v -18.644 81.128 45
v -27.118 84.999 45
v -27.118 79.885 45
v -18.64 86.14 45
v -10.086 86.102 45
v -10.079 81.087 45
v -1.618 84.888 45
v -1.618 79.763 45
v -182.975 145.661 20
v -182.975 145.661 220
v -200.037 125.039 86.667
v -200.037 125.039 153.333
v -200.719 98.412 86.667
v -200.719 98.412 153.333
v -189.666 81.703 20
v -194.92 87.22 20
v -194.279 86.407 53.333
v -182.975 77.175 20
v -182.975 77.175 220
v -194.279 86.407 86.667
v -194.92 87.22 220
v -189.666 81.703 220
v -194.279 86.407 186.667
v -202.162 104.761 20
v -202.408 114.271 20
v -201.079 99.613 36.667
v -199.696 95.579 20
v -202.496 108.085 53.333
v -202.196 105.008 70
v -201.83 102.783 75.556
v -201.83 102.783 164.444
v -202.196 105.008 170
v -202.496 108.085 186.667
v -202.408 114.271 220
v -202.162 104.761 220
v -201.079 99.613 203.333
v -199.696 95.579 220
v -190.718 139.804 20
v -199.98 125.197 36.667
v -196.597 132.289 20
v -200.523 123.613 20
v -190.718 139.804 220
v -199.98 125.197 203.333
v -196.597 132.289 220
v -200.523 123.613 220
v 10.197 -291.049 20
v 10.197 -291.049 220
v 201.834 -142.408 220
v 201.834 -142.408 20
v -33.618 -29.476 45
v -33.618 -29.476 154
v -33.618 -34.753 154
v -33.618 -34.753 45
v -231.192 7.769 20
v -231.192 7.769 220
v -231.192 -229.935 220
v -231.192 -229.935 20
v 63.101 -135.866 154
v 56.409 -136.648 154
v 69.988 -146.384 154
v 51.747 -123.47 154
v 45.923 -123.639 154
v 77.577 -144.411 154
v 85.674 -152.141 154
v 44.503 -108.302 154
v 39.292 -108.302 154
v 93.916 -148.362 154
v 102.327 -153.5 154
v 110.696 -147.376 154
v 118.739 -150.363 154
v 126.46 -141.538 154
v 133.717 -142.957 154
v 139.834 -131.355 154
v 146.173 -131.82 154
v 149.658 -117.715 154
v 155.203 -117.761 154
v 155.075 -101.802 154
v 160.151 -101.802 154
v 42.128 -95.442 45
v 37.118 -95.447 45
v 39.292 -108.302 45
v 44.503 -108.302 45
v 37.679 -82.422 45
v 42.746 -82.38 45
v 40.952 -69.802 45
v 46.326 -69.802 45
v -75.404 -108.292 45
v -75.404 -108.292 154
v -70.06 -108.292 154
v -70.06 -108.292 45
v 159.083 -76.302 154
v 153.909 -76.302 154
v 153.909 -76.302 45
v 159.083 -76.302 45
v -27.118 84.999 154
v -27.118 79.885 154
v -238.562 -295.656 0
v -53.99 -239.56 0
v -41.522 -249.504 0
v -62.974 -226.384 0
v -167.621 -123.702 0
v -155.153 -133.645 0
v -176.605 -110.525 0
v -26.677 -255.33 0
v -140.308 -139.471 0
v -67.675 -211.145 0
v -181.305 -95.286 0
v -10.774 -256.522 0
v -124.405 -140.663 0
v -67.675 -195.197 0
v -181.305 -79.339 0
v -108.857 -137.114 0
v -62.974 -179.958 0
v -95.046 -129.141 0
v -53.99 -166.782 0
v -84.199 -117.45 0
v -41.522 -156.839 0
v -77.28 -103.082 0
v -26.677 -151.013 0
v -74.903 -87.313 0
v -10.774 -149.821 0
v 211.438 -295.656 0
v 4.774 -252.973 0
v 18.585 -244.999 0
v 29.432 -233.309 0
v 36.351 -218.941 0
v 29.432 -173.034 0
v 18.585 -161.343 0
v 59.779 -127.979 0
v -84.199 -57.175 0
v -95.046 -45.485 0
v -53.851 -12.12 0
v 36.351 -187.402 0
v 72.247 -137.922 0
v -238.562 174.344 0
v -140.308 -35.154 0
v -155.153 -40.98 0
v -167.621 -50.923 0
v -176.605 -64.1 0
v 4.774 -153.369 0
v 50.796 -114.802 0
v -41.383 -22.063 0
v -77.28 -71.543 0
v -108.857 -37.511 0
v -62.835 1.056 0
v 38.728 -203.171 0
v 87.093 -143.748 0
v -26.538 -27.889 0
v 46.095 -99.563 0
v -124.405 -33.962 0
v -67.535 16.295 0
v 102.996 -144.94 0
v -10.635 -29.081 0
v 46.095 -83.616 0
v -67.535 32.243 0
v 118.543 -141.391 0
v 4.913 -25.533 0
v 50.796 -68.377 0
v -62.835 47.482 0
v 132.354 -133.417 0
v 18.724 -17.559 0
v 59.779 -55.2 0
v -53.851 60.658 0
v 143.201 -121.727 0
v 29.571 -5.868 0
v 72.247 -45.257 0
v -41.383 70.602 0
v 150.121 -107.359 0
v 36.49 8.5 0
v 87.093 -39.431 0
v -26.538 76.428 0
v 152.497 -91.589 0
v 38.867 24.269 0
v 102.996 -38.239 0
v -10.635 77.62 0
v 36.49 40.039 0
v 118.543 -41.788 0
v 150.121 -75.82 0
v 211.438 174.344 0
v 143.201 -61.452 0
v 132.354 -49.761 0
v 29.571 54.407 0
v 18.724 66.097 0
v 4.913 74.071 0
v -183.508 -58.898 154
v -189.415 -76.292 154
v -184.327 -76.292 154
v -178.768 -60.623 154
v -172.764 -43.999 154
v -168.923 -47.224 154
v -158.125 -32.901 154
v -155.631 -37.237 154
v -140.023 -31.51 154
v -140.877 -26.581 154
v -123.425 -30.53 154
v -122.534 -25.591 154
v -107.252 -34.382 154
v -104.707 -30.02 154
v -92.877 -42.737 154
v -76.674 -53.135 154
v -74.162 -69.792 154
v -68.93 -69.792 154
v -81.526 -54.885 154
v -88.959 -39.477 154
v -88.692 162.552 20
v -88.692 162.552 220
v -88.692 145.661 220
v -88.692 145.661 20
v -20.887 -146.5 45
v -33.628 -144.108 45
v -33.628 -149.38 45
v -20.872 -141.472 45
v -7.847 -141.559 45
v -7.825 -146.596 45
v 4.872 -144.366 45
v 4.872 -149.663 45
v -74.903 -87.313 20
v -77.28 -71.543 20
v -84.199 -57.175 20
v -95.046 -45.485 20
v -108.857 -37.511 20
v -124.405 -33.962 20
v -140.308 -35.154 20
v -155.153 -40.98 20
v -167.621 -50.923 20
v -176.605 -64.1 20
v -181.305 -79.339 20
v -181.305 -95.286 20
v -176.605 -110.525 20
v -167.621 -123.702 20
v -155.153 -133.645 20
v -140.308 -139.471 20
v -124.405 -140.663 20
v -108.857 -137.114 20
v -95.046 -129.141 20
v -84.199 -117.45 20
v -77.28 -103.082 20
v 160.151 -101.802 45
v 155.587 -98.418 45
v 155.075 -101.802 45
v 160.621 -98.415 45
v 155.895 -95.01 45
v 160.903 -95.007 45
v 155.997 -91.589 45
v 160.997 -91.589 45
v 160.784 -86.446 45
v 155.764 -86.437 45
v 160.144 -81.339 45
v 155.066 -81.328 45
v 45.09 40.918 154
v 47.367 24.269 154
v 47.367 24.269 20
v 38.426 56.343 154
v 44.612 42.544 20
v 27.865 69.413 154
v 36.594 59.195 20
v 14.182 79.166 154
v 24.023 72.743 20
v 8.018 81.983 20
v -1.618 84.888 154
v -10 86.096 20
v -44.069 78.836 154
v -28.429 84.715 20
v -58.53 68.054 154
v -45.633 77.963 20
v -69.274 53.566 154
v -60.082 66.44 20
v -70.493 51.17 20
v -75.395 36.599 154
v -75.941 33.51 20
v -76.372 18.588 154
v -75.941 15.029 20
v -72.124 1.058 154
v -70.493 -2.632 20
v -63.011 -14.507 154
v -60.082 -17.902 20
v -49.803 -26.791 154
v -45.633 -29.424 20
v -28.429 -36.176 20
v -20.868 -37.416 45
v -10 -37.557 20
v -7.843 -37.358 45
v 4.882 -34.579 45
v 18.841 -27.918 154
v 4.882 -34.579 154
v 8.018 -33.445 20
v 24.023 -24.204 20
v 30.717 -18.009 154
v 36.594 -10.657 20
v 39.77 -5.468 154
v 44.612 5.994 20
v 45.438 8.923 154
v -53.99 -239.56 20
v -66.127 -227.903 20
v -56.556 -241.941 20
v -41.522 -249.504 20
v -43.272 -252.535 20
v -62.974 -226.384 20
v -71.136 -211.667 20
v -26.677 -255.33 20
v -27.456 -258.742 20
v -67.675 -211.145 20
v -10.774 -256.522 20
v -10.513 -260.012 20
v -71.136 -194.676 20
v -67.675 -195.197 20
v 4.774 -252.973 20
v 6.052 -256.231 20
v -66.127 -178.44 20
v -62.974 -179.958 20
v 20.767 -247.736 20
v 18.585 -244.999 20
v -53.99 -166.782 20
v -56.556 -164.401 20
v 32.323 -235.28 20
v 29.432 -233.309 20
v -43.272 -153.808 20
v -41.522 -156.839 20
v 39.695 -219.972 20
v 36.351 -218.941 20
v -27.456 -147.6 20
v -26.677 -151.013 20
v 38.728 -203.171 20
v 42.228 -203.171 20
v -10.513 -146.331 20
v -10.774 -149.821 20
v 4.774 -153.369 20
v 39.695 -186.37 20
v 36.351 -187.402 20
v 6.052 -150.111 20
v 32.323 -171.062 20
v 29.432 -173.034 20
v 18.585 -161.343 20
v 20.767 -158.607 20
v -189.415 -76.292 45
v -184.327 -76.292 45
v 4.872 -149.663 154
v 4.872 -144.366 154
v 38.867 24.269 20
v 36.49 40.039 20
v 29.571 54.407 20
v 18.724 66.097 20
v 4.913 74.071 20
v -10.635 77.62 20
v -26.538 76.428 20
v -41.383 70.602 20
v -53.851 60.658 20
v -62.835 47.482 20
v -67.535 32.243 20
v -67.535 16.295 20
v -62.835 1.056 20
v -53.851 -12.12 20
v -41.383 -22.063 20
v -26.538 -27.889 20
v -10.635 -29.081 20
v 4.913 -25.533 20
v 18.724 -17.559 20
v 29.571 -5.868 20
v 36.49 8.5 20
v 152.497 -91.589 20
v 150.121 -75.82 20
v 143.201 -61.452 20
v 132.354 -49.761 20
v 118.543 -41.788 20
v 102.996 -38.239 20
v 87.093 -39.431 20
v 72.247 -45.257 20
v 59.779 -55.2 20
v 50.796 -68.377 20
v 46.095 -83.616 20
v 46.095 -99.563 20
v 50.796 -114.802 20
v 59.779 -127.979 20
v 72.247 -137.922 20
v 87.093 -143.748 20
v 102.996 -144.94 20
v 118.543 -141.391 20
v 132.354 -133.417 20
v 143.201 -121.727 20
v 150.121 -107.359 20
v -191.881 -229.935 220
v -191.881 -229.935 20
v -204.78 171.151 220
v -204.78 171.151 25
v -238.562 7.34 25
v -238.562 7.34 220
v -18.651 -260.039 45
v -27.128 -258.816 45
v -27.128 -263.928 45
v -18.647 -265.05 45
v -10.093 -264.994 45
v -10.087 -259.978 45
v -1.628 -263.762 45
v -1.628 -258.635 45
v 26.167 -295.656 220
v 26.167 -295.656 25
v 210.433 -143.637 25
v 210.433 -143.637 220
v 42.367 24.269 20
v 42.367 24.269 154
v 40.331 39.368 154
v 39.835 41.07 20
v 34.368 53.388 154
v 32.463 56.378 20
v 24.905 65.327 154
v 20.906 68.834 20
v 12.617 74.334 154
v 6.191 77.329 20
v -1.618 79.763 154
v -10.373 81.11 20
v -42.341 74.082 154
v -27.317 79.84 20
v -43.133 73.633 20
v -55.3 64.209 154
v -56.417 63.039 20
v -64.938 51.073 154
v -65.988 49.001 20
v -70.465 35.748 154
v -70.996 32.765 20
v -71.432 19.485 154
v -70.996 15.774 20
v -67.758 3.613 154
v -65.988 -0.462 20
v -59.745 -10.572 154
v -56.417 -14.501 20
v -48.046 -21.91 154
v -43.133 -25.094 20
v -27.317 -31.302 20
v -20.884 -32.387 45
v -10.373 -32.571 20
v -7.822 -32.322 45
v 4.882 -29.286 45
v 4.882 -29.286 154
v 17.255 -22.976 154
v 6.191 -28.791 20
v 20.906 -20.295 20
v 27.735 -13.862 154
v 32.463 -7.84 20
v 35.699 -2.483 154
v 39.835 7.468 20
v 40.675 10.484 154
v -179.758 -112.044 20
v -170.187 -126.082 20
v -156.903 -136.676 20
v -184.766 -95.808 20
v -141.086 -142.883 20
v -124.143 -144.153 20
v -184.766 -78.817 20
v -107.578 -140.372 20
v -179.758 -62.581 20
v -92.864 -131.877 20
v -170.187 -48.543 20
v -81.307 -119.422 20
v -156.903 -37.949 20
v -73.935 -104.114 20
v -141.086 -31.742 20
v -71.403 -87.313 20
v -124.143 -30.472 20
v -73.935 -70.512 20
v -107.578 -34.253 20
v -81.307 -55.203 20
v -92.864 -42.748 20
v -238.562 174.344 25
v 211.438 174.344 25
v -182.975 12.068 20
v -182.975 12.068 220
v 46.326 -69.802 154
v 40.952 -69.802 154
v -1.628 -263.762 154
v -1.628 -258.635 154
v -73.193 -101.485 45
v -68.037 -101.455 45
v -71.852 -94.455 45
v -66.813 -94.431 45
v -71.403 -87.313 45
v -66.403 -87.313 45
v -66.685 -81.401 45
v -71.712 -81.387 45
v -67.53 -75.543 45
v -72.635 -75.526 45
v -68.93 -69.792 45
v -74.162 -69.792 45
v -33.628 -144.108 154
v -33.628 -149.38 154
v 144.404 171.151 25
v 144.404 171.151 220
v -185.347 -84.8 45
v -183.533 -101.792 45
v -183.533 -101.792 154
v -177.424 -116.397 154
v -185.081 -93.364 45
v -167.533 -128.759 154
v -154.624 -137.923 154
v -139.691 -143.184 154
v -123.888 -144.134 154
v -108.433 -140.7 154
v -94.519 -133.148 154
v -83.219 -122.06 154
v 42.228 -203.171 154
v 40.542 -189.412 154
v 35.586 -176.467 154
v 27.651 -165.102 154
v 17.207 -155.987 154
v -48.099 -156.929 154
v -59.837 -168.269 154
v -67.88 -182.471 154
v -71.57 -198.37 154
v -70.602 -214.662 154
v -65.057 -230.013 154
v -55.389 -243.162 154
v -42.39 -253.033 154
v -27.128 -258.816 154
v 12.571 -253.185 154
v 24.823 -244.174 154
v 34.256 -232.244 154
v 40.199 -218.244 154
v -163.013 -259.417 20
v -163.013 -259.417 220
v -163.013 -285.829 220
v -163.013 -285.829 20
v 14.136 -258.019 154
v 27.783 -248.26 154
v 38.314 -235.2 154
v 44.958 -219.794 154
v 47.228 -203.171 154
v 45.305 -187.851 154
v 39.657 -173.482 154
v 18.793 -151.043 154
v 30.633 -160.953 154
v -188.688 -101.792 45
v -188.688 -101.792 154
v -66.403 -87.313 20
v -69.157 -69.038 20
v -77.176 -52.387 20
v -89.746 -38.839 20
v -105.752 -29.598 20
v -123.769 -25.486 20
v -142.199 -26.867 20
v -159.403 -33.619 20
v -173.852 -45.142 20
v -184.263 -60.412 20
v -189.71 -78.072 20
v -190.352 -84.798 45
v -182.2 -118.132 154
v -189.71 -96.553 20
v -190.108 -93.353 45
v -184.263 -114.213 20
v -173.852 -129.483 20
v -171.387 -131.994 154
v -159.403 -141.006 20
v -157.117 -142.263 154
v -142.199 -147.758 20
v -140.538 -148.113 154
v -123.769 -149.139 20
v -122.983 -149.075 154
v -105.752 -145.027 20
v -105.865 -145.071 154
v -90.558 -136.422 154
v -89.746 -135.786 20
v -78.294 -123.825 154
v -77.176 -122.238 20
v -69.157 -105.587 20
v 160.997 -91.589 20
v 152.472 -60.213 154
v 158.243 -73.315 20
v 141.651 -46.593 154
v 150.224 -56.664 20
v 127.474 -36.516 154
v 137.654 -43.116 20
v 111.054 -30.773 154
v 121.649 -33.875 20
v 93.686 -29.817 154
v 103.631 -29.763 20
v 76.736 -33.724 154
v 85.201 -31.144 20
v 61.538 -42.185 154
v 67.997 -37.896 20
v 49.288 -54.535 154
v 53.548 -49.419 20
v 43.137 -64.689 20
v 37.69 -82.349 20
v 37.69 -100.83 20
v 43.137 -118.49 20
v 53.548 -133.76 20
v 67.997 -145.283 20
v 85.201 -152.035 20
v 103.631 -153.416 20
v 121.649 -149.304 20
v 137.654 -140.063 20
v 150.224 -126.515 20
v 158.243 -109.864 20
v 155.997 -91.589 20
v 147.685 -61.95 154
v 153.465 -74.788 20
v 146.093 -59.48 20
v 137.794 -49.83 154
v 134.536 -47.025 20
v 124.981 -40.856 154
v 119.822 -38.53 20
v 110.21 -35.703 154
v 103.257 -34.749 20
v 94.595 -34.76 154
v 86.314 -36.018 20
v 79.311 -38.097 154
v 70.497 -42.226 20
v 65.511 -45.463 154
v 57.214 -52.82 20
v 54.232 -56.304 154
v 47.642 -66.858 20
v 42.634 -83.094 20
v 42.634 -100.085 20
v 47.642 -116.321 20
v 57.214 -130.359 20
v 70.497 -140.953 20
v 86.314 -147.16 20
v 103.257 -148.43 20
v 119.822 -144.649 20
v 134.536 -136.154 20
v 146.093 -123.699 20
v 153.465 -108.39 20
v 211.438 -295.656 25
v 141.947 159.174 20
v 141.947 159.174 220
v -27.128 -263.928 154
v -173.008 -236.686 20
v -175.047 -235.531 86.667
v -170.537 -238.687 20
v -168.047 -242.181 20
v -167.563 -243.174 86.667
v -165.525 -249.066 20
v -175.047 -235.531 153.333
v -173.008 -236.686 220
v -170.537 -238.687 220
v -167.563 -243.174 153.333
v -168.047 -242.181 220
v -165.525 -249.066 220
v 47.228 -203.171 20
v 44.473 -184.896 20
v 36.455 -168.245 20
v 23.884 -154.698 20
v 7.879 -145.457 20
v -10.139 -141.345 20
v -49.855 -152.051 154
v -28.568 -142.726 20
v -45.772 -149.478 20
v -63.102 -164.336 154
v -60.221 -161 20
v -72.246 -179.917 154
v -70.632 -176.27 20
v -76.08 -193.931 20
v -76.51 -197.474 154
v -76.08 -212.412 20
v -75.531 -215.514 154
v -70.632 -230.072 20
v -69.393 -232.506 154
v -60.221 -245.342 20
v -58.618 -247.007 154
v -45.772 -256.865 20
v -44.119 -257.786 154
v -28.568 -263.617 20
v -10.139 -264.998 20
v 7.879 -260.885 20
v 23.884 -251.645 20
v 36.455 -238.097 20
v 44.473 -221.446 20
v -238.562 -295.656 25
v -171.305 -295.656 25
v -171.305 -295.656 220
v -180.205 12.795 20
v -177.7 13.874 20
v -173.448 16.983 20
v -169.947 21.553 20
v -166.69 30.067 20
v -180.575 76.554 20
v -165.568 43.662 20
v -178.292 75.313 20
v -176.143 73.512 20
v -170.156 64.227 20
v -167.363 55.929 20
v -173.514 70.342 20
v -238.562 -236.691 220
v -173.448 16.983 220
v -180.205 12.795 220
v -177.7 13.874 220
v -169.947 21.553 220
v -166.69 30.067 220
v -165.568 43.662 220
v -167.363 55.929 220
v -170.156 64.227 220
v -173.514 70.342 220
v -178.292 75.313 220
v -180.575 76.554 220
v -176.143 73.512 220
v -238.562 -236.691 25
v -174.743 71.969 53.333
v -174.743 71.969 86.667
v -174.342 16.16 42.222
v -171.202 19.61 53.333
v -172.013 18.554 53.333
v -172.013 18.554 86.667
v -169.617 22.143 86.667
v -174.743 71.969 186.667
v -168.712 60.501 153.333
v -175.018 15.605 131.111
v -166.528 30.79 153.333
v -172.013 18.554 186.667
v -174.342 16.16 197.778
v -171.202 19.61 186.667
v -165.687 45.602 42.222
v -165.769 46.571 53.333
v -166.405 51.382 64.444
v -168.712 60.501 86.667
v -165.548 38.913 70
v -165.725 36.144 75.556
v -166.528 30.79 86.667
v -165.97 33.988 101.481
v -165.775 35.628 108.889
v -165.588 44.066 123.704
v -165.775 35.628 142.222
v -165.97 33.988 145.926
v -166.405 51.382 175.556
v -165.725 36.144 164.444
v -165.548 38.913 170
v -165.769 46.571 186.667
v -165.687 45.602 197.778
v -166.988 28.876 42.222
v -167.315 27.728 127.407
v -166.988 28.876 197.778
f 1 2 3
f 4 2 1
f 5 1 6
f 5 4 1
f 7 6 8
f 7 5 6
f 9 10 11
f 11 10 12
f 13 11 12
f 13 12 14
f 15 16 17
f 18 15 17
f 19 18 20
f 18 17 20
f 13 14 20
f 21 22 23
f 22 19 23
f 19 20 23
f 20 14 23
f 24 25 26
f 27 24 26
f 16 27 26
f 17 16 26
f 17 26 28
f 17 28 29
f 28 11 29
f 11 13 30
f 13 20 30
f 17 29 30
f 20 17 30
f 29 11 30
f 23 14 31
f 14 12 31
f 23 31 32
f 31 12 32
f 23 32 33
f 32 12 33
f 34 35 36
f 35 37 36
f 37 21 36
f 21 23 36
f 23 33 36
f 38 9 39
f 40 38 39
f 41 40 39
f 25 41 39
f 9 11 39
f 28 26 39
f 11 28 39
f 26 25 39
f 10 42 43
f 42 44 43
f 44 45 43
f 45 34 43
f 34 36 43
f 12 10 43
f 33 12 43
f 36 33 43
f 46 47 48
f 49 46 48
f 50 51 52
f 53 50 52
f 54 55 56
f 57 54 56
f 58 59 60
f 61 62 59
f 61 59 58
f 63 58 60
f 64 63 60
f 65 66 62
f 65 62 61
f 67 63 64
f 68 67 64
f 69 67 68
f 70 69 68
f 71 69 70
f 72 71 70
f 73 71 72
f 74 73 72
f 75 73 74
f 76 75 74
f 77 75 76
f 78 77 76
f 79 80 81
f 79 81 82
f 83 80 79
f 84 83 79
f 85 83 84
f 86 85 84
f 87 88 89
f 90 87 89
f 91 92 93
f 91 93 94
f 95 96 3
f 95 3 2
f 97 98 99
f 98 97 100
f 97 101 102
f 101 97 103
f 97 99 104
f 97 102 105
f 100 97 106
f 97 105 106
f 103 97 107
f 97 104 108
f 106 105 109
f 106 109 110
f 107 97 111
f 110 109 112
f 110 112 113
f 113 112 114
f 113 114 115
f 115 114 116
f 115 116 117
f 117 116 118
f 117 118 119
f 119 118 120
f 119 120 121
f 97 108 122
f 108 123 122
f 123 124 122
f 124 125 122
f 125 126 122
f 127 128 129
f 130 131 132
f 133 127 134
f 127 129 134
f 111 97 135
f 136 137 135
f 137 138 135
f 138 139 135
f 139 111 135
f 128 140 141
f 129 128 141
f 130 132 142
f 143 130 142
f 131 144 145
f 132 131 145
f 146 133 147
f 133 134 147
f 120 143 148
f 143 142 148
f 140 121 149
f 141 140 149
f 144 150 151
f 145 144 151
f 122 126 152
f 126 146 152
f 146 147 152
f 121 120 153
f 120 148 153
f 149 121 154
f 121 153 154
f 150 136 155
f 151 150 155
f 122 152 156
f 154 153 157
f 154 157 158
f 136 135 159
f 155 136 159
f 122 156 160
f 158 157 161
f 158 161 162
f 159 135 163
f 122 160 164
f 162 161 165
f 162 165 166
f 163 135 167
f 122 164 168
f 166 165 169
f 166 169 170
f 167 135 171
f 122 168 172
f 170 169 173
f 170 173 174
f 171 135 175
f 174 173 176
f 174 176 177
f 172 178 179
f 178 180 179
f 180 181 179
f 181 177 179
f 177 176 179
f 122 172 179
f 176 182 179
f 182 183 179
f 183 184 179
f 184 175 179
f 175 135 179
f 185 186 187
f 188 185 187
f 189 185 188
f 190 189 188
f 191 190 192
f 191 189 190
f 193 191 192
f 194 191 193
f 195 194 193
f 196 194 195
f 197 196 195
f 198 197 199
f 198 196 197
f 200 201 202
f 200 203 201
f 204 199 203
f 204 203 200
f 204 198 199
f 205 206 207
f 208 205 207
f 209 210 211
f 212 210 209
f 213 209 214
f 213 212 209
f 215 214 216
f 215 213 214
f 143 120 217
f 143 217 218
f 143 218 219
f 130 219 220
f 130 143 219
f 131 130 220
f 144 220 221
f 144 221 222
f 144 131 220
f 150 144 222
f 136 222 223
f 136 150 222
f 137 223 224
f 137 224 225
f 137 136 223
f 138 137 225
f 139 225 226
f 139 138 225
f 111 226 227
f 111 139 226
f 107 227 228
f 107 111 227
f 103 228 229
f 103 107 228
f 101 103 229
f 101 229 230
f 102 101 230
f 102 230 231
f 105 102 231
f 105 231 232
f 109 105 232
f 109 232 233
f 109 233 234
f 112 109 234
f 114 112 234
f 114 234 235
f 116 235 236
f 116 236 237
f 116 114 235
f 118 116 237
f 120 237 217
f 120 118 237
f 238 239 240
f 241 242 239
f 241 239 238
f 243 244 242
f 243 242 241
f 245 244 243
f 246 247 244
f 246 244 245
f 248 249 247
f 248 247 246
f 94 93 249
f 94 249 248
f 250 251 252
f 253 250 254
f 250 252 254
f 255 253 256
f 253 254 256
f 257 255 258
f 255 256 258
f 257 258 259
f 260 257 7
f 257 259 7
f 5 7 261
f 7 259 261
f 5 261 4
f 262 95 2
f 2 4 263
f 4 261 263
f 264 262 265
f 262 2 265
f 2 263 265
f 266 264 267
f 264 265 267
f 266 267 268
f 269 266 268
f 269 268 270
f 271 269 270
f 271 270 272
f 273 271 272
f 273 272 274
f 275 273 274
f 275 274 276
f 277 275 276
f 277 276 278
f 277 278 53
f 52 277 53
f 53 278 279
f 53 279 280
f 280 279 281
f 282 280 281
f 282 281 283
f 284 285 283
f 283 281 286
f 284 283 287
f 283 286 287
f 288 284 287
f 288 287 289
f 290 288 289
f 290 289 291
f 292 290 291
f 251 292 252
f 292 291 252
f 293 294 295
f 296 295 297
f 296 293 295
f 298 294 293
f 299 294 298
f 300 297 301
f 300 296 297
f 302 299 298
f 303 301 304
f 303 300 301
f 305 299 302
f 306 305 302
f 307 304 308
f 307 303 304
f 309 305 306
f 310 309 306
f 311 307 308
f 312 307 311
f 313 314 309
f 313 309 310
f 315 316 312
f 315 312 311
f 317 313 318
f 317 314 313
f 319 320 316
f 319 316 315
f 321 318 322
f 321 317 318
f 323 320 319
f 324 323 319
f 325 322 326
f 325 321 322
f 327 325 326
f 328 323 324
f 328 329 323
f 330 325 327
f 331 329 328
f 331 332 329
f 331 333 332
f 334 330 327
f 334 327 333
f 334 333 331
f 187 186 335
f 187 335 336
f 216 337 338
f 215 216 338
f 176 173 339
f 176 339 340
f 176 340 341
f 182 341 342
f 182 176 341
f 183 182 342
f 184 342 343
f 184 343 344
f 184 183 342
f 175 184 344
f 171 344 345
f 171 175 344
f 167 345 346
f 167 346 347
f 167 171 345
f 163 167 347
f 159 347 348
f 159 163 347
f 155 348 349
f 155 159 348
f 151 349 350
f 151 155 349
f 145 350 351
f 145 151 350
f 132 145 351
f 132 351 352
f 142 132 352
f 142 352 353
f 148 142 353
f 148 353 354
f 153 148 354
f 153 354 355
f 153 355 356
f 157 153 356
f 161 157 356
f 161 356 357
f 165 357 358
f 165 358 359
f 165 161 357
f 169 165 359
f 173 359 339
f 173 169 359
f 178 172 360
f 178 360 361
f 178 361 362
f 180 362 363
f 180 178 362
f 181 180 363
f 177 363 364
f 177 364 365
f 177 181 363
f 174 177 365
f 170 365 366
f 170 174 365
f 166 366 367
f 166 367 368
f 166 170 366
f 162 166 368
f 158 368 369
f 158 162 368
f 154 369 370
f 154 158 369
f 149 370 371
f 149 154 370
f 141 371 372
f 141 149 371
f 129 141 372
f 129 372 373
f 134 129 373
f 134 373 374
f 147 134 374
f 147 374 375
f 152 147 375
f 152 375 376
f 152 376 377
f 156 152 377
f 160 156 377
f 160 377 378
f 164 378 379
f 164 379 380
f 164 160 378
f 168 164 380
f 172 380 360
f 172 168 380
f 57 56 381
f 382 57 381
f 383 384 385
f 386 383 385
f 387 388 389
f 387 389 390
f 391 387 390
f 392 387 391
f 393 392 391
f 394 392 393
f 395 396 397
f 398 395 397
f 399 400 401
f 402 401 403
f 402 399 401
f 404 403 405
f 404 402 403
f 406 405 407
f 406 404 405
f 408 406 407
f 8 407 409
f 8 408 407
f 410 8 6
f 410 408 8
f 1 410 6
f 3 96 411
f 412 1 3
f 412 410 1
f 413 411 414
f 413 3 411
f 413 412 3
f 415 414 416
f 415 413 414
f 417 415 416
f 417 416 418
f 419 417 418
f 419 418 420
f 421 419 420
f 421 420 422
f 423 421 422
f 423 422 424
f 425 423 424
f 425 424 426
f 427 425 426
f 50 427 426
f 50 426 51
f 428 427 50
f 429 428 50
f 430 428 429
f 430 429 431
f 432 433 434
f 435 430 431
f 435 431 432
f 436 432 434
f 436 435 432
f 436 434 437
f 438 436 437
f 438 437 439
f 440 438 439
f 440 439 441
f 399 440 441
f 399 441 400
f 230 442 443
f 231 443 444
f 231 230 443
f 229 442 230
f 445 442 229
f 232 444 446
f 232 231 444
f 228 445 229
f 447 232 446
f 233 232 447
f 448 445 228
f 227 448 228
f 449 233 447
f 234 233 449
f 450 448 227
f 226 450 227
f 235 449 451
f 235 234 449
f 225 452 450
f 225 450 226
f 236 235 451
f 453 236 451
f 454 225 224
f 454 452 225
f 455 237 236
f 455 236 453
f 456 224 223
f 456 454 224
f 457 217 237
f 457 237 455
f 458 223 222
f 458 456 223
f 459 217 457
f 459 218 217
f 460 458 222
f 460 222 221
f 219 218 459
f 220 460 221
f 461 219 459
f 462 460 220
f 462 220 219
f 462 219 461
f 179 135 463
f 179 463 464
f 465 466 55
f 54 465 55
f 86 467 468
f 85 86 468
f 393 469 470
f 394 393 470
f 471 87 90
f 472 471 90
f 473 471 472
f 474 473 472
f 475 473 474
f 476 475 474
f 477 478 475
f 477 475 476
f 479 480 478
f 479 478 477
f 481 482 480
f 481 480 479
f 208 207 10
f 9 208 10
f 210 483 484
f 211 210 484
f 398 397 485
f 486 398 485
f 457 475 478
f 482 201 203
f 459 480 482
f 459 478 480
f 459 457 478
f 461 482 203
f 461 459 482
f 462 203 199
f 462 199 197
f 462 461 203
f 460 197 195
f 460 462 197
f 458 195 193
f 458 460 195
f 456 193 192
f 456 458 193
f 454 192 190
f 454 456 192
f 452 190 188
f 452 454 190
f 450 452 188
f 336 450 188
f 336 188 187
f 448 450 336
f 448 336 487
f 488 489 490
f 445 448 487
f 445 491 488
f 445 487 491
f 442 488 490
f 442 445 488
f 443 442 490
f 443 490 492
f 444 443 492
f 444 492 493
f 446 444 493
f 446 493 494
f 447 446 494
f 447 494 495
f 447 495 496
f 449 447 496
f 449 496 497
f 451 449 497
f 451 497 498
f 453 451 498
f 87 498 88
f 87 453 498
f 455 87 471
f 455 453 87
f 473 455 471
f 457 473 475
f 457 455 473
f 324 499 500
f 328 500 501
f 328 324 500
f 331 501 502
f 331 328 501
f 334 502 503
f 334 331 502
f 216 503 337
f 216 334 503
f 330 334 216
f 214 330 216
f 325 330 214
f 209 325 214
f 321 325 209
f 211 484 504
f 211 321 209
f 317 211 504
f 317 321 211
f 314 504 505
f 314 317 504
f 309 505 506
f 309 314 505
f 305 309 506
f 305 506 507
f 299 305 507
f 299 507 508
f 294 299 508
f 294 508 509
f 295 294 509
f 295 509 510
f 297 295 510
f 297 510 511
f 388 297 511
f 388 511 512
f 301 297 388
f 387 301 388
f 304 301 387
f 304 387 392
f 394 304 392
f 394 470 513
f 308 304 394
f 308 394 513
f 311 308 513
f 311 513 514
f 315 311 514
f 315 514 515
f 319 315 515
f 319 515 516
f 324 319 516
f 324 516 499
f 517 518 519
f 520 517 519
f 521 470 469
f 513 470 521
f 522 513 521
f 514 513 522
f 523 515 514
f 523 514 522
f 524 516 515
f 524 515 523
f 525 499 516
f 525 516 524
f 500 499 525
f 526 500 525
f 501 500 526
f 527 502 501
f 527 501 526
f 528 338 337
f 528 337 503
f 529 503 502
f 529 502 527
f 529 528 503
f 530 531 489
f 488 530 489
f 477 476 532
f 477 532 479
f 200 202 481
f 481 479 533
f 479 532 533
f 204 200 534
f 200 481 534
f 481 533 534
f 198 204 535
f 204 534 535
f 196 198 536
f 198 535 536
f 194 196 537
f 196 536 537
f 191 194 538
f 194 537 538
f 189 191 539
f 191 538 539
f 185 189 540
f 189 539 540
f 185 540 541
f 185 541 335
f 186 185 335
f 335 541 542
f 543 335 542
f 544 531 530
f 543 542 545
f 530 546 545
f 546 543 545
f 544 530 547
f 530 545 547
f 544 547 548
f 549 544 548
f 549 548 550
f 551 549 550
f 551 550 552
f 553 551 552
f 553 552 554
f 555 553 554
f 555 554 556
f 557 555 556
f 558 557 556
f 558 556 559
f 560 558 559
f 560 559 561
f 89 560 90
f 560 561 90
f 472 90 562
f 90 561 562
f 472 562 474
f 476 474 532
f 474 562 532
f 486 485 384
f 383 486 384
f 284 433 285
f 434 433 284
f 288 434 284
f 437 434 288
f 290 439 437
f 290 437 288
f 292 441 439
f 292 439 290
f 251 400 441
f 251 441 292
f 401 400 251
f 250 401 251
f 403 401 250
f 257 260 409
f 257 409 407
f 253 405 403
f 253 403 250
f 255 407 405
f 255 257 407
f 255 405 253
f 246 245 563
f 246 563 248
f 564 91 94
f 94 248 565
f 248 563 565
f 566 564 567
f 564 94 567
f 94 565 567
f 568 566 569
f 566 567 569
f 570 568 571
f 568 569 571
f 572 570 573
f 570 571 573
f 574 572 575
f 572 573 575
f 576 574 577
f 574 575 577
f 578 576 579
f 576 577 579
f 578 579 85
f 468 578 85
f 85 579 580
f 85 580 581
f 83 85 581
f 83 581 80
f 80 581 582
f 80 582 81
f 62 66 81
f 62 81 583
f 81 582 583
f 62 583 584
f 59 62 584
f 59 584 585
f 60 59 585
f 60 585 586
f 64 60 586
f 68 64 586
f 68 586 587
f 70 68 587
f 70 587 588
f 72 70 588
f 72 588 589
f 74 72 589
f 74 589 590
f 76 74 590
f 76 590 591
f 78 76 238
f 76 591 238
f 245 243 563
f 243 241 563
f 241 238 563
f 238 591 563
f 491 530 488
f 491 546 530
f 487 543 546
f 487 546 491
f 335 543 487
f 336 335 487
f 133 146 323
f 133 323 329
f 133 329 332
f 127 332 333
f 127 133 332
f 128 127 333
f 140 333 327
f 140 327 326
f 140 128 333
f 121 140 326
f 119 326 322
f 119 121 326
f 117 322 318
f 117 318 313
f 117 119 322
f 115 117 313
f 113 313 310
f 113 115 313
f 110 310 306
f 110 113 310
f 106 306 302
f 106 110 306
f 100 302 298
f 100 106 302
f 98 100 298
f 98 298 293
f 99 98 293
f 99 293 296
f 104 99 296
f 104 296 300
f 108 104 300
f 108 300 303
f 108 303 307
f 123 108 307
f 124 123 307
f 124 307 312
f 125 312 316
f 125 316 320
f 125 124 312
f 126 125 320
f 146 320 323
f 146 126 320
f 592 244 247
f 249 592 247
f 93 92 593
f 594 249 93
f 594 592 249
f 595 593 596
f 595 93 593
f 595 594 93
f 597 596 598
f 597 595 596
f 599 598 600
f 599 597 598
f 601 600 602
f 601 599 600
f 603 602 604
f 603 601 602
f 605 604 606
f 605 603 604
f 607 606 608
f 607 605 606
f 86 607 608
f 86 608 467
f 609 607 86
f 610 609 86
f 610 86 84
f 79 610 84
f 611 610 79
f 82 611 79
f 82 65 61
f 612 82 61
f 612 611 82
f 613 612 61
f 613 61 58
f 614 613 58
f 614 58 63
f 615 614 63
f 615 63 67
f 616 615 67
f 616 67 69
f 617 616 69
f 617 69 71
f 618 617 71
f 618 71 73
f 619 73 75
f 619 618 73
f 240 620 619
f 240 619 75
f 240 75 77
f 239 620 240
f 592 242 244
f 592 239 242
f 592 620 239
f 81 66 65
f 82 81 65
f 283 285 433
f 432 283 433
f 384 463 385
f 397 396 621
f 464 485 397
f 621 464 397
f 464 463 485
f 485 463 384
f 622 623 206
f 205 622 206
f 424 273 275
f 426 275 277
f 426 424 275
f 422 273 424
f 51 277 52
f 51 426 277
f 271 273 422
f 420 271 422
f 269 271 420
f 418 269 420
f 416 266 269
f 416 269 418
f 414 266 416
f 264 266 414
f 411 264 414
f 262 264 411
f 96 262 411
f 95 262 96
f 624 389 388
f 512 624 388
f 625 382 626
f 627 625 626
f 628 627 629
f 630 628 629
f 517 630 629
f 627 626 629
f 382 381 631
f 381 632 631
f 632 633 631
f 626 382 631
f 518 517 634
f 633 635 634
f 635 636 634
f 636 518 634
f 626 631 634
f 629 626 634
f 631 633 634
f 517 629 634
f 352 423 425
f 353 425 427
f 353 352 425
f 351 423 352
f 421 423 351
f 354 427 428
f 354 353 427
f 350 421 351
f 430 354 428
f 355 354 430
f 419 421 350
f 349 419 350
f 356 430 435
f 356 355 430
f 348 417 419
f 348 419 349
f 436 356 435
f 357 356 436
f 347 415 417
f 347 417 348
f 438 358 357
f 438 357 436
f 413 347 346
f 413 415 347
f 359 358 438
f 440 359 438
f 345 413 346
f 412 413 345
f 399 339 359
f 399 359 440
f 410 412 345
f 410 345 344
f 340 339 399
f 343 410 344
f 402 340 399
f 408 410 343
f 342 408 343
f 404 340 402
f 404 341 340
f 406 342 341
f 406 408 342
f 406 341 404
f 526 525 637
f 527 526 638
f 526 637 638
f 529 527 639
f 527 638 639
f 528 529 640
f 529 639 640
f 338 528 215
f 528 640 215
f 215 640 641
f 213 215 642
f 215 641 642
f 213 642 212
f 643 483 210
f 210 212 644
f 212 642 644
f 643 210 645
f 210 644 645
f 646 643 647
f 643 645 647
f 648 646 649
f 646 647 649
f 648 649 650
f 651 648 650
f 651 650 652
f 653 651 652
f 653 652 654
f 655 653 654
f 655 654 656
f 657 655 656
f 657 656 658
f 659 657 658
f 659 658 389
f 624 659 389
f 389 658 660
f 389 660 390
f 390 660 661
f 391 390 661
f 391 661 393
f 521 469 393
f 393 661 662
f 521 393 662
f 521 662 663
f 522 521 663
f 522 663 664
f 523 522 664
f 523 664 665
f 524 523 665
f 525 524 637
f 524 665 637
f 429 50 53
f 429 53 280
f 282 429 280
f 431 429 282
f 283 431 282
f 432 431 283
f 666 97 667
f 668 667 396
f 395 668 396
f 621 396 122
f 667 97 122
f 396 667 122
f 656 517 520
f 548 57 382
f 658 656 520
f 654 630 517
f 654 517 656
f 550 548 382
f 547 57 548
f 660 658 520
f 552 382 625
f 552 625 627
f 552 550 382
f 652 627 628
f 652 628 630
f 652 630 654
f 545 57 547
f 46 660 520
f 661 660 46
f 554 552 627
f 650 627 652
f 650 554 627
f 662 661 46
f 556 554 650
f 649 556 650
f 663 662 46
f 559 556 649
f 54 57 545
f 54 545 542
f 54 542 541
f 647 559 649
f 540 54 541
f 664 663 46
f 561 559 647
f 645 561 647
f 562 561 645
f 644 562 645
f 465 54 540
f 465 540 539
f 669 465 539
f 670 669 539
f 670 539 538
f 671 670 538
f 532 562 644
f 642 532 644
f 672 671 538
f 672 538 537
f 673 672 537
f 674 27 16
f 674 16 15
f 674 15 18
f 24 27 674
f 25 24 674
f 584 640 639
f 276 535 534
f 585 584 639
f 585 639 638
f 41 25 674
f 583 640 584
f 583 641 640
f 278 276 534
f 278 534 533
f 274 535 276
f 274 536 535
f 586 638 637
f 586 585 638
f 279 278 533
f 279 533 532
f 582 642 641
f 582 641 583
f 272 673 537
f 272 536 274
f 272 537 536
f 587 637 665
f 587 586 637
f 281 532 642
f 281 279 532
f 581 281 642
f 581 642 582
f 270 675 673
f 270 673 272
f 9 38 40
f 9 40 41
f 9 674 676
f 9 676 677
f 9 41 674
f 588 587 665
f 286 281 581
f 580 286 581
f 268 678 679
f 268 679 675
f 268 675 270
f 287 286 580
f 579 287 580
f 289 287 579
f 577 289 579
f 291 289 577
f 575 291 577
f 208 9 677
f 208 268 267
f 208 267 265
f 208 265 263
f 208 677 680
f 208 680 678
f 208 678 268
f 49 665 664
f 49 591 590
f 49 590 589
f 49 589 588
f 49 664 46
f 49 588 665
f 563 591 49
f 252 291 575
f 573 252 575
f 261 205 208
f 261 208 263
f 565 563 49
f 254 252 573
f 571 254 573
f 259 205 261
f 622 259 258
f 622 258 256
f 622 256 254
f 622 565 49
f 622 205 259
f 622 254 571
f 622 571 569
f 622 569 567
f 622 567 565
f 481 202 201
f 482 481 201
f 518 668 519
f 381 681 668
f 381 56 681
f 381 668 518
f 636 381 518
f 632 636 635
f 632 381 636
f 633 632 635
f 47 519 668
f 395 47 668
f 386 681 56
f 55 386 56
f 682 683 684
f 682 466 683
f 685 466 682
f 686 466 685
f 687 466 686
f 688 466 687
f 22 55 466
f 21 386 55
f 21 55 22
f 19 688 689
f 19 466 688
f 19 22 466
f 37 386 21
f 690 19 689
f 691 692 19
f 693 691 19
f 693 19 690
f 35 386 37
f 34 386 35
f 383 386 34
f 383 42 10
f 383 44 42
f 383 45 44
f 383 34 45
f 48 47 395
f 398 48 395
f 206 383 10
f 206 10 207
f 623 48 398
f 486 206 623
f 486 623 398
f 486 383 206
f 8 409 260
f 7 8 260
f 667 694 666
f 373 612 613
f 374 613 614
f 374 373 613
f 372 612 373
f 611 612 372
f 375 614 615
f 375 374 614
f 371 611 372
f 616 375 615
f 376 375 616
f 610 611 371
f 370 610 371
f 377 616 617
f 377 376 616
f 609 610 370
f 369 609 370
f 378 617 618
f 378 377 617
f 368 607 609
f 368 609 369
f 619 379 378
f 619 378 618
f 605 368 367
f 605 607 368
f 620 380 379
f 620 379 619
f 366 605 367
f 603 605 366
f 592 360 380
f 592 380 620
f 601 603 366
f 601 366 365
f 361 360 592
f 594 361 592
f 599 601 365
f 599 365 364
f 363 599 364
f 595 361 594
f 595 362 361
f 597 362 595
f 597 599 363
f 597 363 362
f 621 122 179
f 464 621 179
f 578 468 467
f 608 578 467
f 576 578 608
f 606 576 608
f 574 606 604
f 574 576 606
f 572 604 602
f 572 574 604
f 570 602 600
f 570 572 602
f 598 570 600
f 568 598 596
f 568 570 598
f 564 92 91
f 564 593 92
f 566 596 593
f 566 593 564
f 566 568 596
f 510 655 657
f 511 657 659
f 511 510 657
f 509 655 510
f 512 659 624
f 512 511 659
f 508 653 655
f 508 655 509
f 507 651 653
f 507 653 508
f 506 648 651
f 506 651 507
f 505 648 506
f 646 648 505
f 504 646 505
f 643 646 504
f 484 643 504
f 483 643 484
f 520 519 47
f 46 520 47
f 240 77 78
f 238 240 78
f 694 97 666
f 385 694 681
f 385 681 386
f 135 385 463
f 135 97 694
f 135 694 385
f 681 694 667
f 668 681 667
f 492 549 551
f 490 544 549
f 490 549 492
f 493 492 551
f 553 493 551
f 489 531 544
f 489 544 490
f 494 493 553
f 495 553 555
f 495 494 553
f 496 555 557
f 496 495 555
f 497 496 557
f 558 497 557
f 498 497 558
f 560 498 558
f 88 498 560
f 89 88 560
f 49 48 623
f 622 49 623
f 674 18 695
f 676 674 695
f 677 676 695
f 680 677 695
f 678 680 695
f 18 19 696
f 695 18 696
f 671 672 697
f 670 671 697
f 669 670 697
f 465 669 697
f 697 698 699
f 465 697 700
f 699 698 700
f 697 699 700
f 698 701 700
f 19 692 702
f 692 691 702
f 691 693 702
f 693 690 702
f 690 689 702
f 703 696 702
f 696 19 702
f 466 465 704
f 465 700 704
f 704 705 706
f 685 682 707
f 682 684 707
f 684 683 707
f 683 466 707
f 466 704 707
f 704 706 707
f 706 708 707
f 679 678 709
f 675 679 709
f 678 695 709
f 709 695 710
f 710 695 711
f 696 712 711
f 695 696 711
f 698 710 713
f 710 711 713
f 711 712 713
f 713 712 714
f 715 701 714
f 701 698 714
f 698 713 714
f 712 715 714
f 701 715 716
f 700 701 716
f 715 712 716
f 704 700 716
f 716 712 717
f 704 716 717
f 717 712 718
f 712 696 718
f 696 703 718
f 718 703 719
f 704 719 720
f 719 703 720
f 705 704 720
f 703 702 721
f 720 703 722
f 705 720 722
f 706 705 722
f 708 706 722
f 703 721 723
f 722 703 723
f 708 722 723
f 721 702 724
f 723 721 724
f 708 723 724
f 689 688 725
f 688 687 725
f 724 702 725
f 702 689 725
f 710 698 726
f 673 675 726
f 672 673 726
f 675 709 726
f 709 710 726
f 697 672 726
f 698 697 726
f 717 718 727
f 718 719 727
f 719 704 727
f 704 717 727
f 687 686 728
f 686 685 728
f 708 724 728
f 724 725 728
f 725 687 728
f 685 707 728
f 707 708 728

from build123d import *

# Parameters (mm, degrees)
F1_DEPTH  = 220
F3_W      = 450
F3_H      = 470
F4_DEPTH  = 25
F5_DEPTH  = 200
F6_R      = 53.5
F7_DEPTH  = 20
F6_R_2    = 62
F6_R_3    = 57
F8_DEPTH  = 154
F9_W      = 25.5
F9_H      = 90.3576454148
F9_W_2    = 90.3576454148
F9_H_2    = 25.5
F10_DEPTH = 175


with BuildPart() as f1:
    # F0 (on Top) → F1 (new body)
    with BuildSketch(Plane.XY):
        Polygon((-204.7800719738, 171.1511015892), (-238.562181592, 7.3397289511), (-238.562181592, -236.6909831762), (-171.305090189, -295.6561148167), (26.1666476727, -295.6561148167), (210.4326635599, -143.6366438866), (144.4040089846, 171.1511015892), align=None)
    extrude(amount=F1_DEPTH)

    # F3 (on Top) → F4 (join)
    with BuildSketch(Plane.XY):
        with Locations((-13.562181592, -60.6561148167)):
            Rectangle(F3_W, F3_H)
    extrude(amount=F4_DEPTH)

    # F2 (on face) → F5 (cut)
    with BuildSketch(Plane.XY.offset(220)):
        with BuildLine():
            Line((141.9471204281, 159.1738164425), (-88.6924937367, 162.5520288944))
            Line((-88.6924937367, 162.5520288944), (-88.6924937367, 145.6609666348))
            Line((-88.6924937367, 145.6609666348), (-182.9752624035, 145.6609666348))
            add(Edge.make_bspline(
                [(-182.9752624035, 145.6609666348), (-207.5440585613, 131.841018796), (-210.6151580811, 91.9167175889), (-182.9752624035, 77.1754458547)],
                knots=[0, 0, 0, 0, 68.4855207801, 68.4855207801, 68.4855207801, 68.4855207801], degree=3))
            add(Edge.make_bspline(
                [(-182.9752624035, 77.1754458547), (-164.8557782173, 75.025677681), (-155.0282537937, 17.2889921814), (-182.9752624035, 12.0681189001)],
                knots=[0, 0, 0, 0, 65.1073269546, 65.1073269546, 65.1073269546, 65.1073269546], degree=3))
            Line((-182.9752624035, 12.0681189001), (-231.1915457249, 7.7685844153))
            Line((-231.1915457249, 7.7685844153), (-231.1915457249, -229.9345582724))
            Line((-231.1915457249, -229.9345582724), (-191.8814480305, -229.9345582724))
            add(Edge.make_bspline(
                [(-191.8814480305, -229.9345582724), (-168.2339906693, -236.6909831762), (-168.2339906693, -236.6909831762), (-163.0131155252, -259.417116642)],
                knots=[0, 0, 0, 0, 41.2625964967, 41.2625964967, 41.2625964967, 41.2625964967], degree=3))
            Line((-163.0131155252, -259.417116642), (-163.0131155252, -285.8285903931))
            Line((-163.0131155252, -285.8285903931), (10.1969307289, -291.0494506359))
            Line((10.1969307289, -291.0494506359), (201.833575964, -142.4082070589))
            Line((201.833575964, -142.4082070589), (141.9471204281, 159.1738164425))
        make_face()
    extrude(amount=-F5_DEPTH, mode=Mode.SUBTRACT)

    # F6 (on Top) → F7 (cut, through all)
    with BuildSketch(Plane.XY):
        with Locations((-14.6330455318, 24.2691934109)):
            Circle(F6_R)
        with Locations((-128.4027075395, -87.3125935497)):
            Circle(F6_R)
        with Locations((-14.7721923306, -203.1711548904)):
            Circle(F6_R)
        with Locations((98.9974696771, -91.5893679298)):
            Circle(F6_R)
    extrude(amount=F7_DEPTH, mode=Mode.SUBTRACT)

    # F6 (on Top) → F8 (join)
    with BuildSketch(Plane.XY):
        with Locations((98.9974696771, -91.5893679298)):
            Circle(F6_R_2)
        with Locations((98.9974696771, -91.5893679298)):
            Circle(F6_R_3, mode=Mode.SUBTRACT)
        with Locations((-14.6330455318, 24.2691934109)):
            Circle(F6_R_2)
        with Locations((-14.6330455318, 24.2691934109)):
            Circle(F6_R_3, mode=Mode.SUBTRACT)
        with Locations((-128.4027075395, -87.3125935497)):
            Circle(F6_R_2)
        with Locations((-128.4027075395, -87.3125935497)):
            Circle(F6_R_3, mode=Mode.SUBTRACT)
        with Locations((-14.7721923306, -203.1711548904)):
            Circle(F6_R_2)
        with Locations((-14.7721923306, -203.1711548904)):
            Circle(F6_R_3, mode=Mode.SUBTRACT)
    extrude(amount=F8_DEPTH)

    # F9 (on face) → F10 (cut)
    with BuildSketch(Plane.XY.offset(220)):
        Polygon((-14.3728665248, -89.0469396694), (4.8721171106, -89.0469396694), (4.8821498398, -89.0469396694), (4.8821498398, -69.801956034), (-14.3728665248, -69.801956034), align=None)
        Polygon((4.8721171106, -108.301956034), (4.8721171106, -89.0469396694), (-14.3728665248, -89.0469396694), (-14.3728665248, -108.2919233048), (-14.3728665248, -108.301956034), align=None)
        Polygon((4.8821498398, -89.0469396694), (4.8721171106, -89.0469396694), (4.8721171106, -108.301956034), (89.2823901994, -108.301956034), (89.2823901994, -101.801956034), (89.2823901994, -76.301956034), (89.2823901994, -69.801956034), (4.8821498398, -69.801956034), align=None)
        Polygon((-14.3728665248, -108.2919233048), (-14.3728665248, -89.0469396694), (-33.6178501602, -89.0469396694), (-33.6278828894, -89.0469396694), (-33.6278828894, -108.2919233048), align=None)
        Polygon((-33.6178501602, -89.0469396694), (-14.3728665248, -89.0469396694), (-14.3728665248, -69.801956034), (-14.3728665248, -69.7919233048), (-33.6178501602, -69.7919233048), align=None)
        Polygon((4.8721171106, -192.7021963936), (4.8721171106, -108.301956034), (-14.3728665248, -108.301956034), (-14.3728665248, -108.2919233048), (-33.6278828894, -108.2919233048), (-33.6278828894, -192.7021963936), (-27.1278828894, -192.7021963936), (-1.6278828894, -192.7021963936), align=None)
        Polygon((-14.3728665248, -69.801956034), (4.8821498398, -69.801956034), (4.8821498398, 14.6083170548), (-1.6178501602, 14.6083170548), (-27.1178501602, 14.6083170548), (-33.6178501602, 14.6083170548), (-33.6178501602, -69.7919233048), (-14.3728665248, -69.7919233048), align=None)
        Polygon((-33.6278828894, -89.0469396694), (-33.6178501602, -89.0469396694), (-33.6178501602, -69.7919233048), (-118.028123249, -69.7919233048), (-118.028123249, -76.2919233048), (-118.028123249, -101.7919233048), (-118.028123249, -108.2919233048), (-33.6278828894, -108.2919233048), align=None)
        with Locations((-14.3778828894, -237.881019101)):
            Rectangle(F9_W, F9_H)
        with Locations((134.4612129068, -89.051956034)):
            Rectangle(F9_W_2, F9_H_2)
        with Locations((-14.3678501602, 59.7871397622)):
            Rectangle(F9_W, F9_H)
        with Locations((-163.2069459564, -89.0419233048)):
            Rectangle(F9_W_2, F9_H_2)
    extrude(amount=-F10_DEPTH, mode=Mode.SUBTRACT)


solid = f1.part
